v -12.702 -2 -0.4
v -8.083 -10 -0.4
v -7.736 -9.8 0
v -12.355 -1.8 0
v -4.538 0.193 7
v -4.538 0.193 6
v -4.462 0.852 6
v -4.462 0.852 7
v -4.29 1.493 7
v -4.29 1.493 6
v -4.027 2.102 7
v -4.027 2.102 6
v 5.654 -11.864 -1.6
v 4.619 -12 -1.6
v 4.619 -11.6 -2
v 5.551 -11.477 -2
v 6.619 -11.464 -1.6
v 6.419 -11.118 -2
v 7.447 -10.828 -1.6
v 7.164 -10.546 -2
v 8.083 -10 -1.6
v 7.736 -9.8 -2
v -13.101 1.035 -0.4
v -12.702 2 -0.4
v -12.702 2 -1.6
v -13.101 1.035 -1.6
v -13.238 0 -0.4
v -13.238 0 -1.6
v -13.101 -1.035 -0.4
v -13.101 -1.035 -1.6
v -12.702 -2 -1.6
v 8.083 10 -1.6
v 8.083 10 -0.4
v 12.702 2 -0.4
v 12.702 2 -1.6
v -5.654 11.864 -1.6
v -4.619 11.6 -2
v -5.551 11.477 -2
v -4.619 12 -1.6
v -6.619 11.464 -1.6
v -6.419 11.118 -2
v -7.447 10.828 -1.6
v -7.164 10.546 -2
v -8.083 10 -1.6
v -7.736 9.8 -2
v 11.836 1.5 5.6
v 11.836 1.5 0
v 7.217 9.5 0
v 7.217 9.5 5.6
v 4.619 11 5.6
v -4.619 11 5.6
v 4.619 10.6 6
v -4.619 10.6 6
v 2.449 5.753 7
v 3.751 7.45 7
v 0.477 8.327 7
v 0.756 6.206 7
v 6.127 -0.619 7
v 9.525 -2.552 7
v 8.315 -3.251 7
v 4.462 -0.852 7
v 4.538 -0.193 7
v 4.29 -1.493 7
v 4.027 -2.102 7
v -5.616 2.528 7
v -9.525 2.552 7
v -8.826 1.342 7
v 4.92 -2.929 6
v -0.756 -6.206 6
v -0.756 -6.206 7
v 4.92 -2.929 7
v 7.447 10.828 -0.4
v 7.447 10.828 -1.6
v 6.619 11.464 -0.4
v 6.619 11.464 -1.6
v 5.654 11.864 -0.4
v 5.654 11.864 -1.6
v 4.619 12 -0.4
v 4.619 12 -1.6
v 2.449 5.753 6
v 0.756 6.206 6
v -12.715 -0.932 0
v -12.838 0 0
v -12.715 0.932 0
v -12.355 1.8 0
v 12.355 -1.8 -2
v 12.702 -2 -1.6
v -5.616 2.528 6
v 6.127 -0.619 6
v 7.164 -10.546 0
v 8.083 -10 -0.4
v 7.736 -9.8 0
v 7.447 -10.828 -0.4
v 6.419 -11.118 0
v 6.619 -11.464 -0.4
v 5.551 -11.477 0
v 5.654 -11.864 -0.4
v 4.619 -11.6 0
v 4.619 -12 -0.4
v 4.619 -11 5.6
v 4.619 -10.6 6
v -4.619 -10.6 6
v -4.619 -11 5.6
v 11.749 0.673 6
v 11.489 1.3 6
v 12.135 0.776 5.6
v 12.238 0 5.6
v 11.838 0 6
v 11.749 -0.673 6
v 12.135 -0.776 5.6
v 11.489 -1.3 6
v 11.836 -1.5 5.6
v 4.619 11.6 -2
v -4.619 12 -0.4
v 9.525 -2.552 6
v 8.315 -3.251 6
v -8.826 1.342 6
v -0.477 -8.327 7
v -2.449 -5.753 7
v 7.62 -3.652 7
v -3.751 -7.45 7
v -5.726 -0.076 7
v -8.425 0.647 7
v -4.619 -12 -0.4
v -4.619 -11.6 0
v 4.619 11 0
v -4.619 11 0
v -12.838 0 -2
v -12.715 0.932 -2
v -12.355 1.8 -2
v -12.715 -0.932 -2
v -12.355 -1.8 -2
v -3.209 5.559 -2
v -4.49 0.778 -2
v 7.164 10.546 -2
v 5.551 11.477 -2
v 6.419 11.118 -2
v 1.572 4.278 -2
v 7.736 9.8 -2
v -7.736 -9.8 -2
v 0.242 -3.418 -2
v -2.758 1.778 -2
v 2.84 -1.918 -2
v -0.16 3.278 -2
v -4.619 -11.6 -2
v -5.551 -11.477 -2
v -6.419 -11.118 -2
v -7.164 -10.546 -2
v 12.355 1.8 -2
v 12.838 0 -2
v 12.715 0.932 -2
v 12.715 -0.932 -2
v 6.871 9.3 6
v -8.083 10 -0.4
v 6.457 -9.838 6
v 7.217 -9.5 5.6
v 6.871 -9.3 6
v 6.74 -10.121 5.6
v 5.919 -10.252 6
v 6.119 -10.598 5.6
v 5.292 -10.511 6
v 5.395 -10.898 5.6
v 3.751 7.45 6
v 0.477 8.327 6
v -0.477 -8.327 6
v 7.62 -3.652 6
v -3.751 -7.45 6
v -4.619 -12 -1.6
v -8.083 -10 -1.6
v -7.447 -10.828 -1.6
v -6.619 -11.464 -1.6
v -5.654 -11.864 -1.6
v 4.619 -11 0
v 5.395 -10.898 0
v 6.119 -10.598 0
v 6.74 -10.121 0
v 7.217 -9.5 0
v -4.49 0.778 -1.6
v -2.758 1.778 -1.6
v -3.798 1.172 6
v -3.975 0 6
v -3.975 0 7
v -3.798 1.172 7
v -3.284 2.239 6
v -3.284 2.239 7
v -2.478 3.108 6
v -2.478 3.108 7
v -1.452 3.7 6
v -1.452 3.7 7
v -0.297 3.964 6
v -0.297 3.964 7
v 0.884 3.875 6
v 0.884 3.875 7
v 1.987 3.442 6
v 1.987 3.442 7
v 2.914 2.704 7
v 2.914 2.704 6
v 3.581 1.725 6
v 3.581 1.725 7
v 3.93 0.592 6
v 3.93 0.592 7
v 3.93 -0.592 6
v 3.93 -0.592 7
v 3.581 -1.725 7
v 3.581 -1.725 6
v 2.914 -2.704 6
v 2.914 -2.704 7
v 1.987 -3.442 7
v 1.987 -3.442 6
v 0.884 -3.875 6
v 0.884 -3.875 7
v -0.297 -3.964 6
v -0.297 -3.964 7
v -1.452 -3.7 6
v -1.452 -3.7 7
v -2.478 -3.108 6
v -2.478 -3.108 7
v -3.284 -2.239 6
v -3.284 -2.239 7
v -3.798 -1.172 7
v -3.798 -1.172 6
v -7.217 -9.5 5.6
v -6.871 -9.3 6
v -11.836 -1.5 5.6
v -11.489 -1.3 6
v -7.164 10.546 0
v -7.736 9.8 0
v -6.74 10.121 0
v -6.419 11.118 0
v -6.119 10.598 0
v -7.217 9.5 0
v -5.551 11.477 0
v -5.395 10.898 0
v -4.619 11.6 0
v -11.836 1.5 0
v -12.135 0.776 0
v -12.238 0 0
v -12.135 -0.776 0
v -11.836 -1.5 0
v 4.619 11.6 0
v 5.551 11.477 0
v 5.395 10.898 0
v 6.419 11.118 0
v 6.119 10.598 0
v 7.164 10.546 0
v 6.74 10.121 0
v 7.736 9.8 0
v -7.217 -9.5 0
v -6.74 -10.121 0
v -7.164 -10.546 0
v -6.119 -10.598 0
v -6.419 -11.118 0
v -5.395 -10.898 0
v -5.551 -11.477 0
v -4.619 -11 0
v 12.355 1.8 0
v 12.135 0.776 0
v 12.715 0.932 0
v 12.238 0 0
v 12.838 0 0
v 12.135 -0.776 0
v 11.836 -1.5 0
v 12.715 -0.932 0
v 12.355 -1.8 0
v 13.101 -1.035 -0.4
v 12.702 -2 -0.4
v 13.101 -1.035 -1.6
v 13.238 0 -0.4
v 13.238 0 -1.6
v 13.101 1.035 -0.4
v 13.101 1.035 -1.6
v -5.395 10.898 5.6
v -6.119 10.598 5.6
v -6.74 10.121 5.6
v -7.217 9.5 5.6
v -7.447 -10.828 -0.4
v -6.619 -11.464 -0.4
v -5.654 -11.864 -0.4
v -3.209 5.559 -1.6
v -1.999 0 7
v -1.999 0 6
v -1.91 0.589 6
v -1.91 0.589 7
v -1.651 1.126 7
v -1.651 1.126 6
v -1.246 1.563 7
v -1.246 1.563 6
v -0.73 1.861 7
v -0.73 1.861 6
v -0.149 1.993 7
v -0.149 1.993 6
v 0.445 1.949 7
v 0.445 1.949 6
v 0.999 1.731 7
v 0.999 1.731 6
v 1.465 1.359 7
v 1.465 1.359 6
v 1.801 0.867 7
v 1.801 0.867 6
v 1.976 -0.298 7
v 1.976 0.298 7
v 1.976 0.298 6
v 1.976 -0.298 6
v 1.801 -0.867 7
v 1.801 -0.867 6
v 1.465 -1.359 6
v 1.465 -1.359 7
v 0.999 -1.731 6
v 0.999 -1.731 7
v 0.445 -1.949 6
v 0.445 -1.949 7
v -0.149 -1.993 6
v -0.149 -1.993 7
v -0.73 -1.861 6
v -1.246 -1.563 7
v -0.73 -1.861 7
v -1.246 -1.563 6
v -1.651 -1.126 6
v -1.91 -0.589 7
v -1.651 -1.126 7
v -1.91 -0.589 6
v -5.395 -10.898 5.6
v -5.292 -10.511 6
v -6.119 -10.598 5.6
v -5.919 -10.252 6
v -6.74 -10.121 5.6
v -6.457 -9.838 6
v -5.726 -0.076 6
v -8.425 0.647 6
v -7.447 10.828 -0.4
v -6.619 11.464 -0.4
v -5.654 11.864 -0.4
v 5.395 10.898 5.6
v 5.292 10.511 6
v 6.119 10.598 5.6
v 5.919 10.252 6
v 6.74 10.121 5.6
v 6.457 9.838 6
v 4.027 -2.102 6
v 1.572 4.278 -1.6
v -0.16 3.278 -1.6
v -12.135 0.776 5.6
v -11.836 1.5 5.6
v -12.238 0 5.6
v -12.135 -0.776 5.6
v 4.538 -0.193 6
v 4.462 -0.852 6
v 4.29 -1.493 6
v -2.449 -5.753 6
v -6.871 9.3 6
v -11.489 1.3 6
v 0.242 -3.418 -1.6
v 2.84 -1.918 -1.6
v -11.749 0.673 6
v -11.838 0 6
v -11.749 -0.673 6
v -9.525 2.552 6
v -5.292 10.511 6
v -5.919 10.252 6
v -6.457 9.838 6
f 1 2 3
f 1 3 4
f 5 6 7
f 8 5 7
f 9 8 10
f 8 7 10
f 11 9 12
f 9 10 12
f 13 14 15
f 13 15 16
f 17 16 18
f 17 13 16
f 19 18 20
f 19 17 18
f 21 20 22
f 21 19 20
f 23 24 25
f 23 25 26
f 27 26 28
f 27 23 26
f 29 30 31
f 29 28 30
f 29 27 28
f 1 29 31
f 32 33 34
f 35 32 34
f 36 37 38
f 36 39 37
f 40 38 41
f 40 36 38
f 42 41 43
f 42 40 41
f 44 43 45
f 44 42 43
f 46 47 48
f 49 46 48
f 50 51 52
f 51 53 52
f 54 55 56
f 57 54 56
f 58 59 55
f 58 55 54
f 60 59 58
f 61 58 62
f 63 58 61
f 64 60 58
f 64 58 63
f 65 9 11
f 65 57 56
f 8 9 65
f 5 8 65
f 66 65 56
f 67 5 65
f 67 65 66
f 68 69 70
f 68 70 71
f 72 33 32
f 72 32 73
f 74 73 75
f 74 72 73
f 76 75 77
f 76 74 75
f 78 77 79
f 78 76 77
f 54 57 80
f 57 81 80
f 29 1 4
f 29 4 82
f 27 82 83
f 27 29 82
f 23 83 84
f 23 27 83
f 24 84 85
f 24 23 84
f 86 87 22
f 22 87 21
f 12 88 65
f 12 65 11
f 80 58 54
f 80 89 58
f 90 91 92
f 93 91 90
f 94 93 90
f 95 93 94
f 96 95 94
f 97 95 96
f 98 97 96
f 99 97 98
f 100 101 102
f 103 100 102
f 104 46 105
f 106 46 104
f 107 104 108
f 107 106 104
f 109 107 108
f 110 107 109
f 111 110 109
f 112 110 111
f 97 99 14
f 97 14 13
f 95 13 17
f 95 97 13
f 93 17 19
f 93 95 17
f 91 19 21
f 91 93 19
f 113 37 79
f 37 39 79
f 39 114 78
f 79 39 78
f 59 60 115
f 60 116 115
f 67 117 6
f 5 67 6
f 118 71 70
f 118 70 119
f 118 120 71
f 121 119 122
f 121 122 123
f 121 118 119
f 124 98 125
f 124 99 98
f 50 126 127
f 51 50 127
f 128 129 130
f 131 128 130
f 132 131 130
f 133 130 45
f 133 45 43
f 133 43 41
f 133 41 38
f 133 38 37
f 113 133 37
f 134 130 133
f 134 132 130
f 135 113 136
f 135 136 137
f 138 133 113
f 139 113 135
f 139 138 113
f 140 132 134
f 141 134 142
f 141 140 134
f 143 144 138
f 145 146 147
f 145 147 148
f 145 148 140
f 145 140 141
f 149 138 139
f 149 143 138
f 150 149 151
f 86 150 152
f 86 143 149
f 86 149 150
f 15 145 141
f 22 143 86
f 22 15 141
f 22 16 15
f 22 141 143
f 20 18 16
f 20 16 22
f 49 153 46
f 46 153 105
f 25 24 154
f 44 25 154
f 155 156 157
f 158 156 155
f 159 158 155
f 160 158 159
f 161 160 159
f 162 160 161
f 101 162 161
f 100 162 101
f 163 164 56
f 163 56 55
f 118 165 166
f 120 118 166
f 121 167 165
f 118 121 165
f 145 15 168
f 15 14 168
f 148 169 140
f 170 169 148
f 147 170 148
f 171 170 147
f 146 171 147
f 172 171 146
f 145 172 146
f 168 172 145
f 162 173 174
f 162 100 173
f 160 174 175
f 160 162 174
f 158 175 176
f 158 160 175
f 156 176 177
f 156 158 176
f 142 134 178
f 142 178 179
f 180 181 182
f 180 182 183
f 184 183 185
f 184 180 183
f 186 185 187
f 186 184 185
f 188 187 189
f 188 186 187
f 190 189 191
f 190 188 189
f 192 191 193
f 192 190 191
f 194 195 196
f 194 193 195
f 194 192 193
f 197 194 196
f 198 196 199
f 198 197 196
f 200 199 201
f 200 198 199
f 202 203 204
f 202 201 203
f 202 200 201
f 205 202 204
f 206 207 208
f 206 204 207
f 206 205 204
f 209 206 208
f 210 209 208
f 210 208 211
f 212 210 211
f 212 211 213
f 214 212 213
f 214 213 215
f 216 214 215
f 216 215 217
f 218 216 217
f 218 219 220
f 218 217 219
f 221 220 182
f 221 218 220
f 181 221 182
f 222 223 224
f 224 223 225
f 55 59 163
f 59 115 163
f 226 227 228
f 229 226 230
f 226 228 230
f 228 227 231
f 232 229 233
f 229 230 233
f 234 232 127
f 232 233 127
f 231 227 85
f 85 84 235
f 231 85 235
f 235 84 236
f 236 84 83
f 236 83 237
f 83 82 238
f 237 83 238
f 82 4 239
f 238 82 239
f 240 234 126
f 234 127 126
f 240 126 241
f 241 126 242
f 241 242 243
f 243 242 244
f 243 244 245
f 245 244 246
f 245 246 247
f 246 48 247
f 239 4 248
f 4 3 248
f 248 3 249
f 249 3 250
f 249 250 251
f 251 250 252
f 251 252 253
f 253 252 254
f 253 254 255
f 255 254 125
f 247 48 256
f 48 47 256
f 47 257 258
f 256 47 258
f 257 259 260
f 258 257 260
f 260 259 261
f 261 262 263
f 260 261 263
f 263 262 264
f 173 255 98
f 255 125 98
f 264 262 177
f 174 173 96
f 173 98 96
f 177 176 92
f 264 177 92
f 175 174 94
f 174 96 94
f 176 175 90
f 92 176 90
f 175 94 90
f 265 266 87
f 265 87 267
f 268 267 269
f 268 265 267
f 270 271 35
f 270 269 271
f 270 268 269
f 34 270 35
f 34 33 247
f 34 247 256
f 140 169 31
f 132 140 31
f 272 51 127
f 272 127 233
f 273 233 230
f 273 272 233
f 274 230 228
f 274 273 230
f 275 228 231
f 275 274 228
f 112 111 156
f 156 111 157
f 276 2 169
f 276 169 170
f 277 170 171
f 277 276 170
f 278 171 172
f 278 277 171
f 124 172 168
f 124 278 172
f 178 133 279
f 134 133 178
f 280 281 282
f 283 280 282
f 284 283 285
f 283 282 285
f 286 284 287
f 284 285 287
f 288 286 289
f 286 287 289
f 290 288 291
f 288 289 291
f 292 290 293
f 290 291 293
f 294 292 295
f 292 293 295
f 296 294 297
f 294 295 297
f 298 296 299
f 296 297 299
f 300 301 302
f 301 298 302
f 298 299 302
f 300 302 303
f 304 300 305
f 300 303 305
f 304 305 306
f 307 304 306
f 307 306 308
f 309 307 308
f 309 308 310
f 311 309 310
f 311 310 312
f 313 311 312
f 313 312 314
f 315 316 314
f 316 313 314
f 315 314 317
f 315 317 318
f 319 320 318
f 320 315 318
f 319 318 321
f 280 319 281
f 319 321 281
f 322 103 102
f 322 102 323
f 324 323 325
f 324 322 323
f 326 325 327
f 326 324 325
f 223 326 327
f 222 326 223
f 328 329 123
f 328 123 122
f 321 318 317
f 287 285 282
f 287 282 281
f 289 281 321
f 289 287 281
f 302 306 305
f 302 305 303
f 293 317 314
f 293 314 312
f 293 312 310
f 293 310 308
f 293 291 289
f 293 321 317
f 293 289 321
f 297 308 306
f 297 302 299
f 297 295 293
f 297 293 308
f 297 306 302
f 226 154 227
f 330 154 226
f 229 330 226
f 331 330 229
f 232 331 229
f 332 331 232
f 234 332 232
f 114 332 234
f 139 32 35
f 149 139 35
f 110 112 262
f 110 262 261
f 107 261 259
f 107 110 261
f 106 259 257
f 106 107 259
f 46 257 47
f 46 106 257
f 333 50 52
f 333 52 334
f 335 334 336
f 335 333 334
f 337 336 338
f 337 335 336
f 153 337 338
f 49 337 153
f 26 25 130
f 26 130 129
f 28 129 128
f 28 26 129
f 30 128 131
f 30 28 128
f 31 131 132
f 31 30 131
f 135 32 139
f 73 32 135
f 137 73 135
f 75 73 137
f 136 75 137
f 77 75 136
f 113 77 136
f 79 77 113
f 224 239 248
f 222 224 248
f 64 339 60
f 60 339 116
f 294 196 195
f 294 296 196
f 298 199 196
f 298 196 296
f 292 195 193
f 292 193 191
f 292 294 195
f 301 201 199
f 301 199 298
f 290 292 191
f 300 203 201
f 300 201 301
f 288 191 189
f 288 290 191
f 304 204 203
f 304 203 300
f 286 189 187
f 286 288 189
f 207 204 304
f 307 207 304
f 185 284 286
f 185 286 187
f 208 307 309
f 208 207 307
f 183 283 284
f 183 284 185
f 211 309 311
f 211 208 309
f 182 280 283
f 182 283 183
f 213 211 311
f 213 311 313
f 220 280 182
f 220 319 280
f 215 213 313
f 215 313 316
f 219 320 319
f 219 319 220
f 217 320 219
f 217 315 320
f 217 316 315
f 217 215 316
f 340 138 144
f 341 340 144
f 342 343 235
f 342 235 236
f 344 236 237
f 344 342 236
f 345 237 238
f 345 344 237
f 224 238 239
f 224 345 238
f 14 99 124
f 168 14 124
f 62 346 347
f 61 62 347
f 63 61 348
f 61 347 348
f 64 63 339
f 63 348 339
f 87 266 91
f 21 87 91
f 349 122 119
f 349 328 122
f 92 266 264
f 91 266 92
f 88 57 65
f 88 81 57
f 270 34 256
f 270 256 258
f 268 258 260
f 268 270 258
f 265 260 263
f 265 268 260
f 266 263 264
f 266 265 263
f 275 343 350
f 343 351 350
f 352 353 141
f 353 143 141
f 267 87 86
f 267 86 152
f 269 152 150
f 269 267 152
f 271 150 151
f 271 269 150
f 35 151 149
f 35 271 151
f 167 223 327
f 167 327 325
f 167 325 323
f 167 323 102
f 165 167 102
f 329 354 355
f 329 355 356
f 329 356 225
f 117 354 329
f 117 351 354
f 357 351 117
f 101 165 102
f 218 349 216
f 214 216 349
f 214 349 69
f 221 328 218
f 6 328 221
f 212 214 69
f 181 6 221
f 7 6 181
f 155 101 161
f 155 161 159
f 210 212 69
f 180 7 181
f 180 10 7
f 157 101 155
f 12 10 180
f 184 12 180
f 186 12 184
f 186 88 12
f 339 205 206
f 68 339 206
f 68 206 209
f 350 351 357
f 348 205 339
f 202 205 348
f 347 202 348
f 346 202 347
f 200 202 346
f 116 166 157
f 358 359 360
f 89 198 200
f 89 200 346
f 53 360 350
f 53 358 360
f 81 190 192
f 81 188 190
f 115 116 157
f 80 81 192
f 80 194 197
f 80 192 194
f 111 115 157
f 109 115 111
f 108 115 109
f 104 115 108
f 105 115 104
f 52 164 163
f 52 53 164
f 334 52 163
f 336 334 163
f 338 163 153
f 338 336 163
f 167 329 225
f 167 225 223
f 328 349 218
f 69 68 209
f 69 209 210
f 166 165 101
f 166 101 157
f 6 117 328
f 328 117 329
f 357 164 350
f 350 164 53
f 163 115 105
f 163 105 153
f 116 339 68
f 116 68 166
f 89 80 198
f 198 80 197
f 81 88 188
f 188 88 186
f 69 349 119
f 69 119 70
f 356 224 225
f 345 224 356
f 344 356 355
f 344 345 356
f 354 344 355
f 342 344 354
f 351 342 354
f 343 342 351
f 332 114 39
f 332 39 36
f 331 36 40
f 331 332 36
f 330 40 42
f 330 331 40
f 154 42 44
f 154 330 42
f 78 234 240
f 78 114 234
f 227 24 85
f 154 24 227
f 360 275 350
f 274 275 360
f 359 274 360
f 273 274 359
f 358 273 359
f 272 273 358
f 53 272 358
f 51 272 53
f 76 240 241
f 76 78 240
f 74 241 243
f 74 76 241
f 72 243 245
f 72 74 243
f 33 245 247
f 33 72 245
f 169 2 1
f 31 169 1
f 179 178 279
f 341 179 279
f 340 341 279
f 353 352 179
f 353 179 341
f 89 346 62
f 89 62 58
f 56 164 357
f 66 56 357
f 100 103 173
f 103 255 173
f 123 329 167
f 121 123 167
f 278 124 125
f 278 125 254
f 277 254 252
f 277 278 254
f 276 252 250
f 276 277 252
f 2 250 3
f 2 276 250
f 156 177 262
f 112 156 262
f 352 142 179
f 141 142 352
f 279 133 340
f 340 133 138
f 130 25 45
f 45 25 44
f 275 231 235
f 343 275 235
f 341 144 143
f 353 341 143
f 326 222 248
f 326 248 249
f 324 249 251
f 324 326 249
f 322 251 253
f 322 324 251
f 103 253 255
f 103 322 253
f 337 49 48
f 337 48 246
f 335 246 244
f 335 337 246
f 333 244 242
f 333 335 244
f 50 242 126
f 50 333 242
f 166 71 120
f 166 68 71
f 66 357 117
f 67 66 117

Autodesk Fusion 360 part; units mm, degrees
sketch "Sketch1" plane through (0, 0, 0) normal (0, 0, 1) x (1, 0, 0)
  line L0 (-6.3509, 11) -> (-12.7017, 0)
  line L1 (-12.7017, 0) -> (-6.3509, -11)
  line L2 (-6.3509, -11) -> (6.3509, -11)
  line L3 (6.3509, -11) -> (12.7017, 0)
  line L4 (12.7017, 0) -> (6.3509, 11)
  line L5 (6.3509, 11) -> (-6.3509, 11)
  dimension "d1" = 11
extrude "Extrude1" add sketch "Sketch1" along normal blind 6
fillet "Fillet1" radius 3 6 edges at (6.3509, -11, 3) (12.7017, 0, 3) (-6.3509, -11, 3) (-12.7017, 0, 3) (-6.3509, 11, 3) (6.3509, 11, 3)
sketch "Sketch2" plane through (0, 0, 0) normal (0, 0, -1) x (1, 0, 0)
  arc A0 (4.6188, -11) -> (7.2169, -9.5) centre (4.6188, -8) ccw
  line L0 (7.2169, -9.5) -> (11.8357, -1.5)
  arc A1 (11.8357, -1.5) -> (11.8357, 1.5) centre (9.2376, 0) ccw
  line L1 (11.8357, 1.5) -> (7.2169, 9.5) construction
  arc A2 (7.2169, 9.5) -> (4.6188, 11) centre (4.6188, 8) ccw
  line L2 (4.6188, 11) -> (-4.6188, 11)
  arc A3 (-4.6188, 11) -> (-7.2169, 9.5) centre (-4.6188, 8) ccw
  line L3 (-7.2169, 9.5) -> (-11.8357, 1.5)
  arc A4 (-11.8357, 1.5) -> (-11.8357, -1.5) centre (-9.2376, 0) ccw
  line L4 (-11.8357, -1.5) -> (-7.2169, -9.5)
  arc A5 (-7.2169, -9.5) -> (-4.6188, -11) centre (-4.6188, -8) ccw
  line L5 (-4.6188, -11) -> (4.6188, -11)
  line L6 (-8.0829, 10) -> (-12.7017, 2)
  arc A6 (-12.7017, 2) -> (-12.7017, -2) centre (-9.2376, 0) ccw
  line L7 (-12.7017, -2) -> (-8.0829, -10)
  arc A7 (-8.0829, -10) -> (-4.6188, -12) centre (-4.6188, -8) ccw
  line L8 (-4.6188, -12) -> (4.6188, -12)
  arc A8 (4.6188, -12) -> (8.0829, -10) centre (4.6188, -8) ccw
  line L9 (8.0829, -10) -> (12.7017, -2)
  arc A9 (12.7017, -2) -> (12.7017, 2) centre (9.2376, 0) ccw
  line L10 (12.7017, 2) -> (8.0829, 10)
  arc A10 (8.0829, 10) -> (4.6188, 12) centre (4.6188, 8) ccw
  line L11 (4.6188, 12) -> (-4.6188, 12)
  arc A11 (-4.6188, 12) -> (-8.0829, 10) centre (-4.6188, 8) ccw
  dimension "d6" = 1
extrude "Extrude2" add sketch "Sketch2" along normal blind 2
sketch "Sketch3" plane through (0, 0, 6) normal (0, 0, 1) x (-1, 0, 0)
  arc A0 (-7.2169, -9.5) -> (-4.6188, -11) centre (-4.6188, -8) ccw
  line L0 (-4.6188, -11) -> (4.6188, -11)
  arc A1 (4.6188, -11) -> (7.2169, -9.5) centre (4.6188, -8) ccw
  line L1 (7.2169, -9.5) -> (11.8357, -1.5) construction
  arc A2 (11.8357, -1.5) -> (11.8357, 1.5) centre (9.2376, 0) ccw
  line L2 (11.8357, 1.5) -> (7.2169, 9.5)
  arc A3 (7.2169, 9.5) -> (4.6188, 11) centre (4.6188, 8) ccw
  line L3 (4.6188, 11) -> (-4.6188, 11)
  arc A4 (-4.6188, 11) -> (-7.2169, 9.5) centre (-4.6188, 8) ccw
  line L4 (-7.2169, 9.5) -> (-11.8357, 1.5)
  arc A5 (-11.8357, 1.5) -> (-11.8357, -1.5) centre (-9.2376, 0) ccw
  line L5 (-11.8357, -1.5) -> (-7.2169, -9.5)
  line L6 (8.425, -0.6467) -> (5.7257, 0.0765)
  line L7 (5.6158, -2.5276) -> (4.0271, -2.1019)
  line L8 (5.7257, 0.0765) -> (2.4486, 5.7527)
  line L9 (-4.0271, 2.1019) -> (-8.3151, 3.2509)
  line L10 (-0.4766, -8.3268) -> (9.5251, -2.5523)
  line L11 (-9.5251, 2.5523) -> (-3.7506, -7.4495)
  line L12 (8.425, -0.6467) -> (3.7506, 7.4495)
  line L13 (-0.7558, -6.2062) -> (5.6158, -2.5276)
  line L14 (-4.9203, 2.9291) -> (-7.6196, 3.6524)
  line L15 (-8.3151, 3.2509) -> (-9.5251, 2.5523)
  line L16 (0.7558, 6.2062) -> (-4.9203, 2.9291)
  line L17 (0.4766, 8.3268) -> (-7.6196, 3.6524)
  line L18 (9.5251, -2.5523) -> (8.8265, -1.3422)
  line L19 (-6.1272, 0.6189) -> (-2.4486, -5.7527)
  line L20 (8.8265, -1.3422) -> (4.5385, -0.1932)
  line L21 (3.7506, 7.4495) -> (0.4766, 8.3268)
  line L22 (2.4486, 5.7527) -> (0.7558, 6.2062)
  line L23 (-0.7558, -6.2062) -> (-2.4486, -5.7527)
  line L24 (-0.4766, -8.3268) -> (-3.7506, -7.4495)
  circle A6 centre (0, 0) radius 1.9987
  circle A7 centre (0, 0) radius 3.9748
  arc A8 (-4.0271, 2.1019) -> (-4.5385, 0.1932) centre (0, 0) ccw
  line L25 (-4.5385, 0.1932) -> (-6.1272, 0.6189)
  arc A9 (4.0271, -2.1019) -> (4.5385, -0.1932) centre (0, 0) ccw
extrude "Extrude3" add sketch "Sketch3" along normal blind 1
chamfer "Chamfer1" distance 0.4 angle 45 36 edges at (9.5263, -5.5, 6) (12.2376, 0, 6) (9.5263, 5.5, 6) (6.1188, 10.5981, 6) (0, 11, 6) (-6.1188, 10.5981, 6) (-9.5263, 5.5, 6) (-12.2376, 0, 6) (-9.5263, -5.5, 6) (-6.1188, -10.5981, 6) (0, -11, 6) (6.1188, -10.5981, 6) (10.3923, -6, 0) (6.6188, -11.4641, 0) (0, -12, 0) (-6.6188, -11.4641, 0) (-10.3923, -6, 0) (-13.2376, 0, 0) (-10.3923, 6, 0) (-6.6188, 11.4641, 0) (0, 12, 0) (6.6188, 11.4641, 0) (10.3923, 6, 0) (13.2376, 0, 0) (10.3923, -6, -2) (6.6188, -11.4641, -2) (0, -12, -2) (-6.6188, -11.4641, -2) (-10.3923, -6, -2) (-13.2376, 0, -2) (-10.3923, 6, -2) (-6.6188, 11.4641, -2) (0, 12, -2) (6.6188, 11.4641, -2) (10.3923, 6, -2) (13.2376, 0, -2)
sketch "Sketch4" plane through (0, 0, -2) normal (0, 0, -1) x (1, 0, 0)
  line L0 (12.3553, 1.8) -> (7.7365, 9.8)
  arc A0 (7.7365, 9.8) -> (4.6188, 11.6) centre (4.6188, 8) ccw
  line L1 (4.6188, 11.6) -> (-4.6188, 11.6)
  arc A1 (-4.6188, 11.6) -> (-7.7365, 9.8) centre (-4.6188, 8) ccw
  line L2 (-7.7365, 9.8) -> (-12.3553, 1.8)
  arc A2 (-12.3553, 1.8) -> (-12.3553, -1.8) centre (-9.2376, 0) ccw
  line L3 (-12.3553, -1.8) -> (-7.7365, -9.8)
  arc A3 (-7.7365, -9.8) -> (-4.6188, -11.6) centre (-4.6188, -8) ccw
  line L4 (-4.6188, -11.6) -> (4.6188, -11.6)
  arc A4 (4.6188, -11.6) -> (7.7365, -9.8) centre (4.6188, -8) ccw
  line L5 (7.7365, -9.8) -> (12.3553, -1.8)
  arc A5 (12.3553, -1.8) -> (12.3553, 1.8) centre (9.2376, 0) ccw
  line L6 (0, 0) -> (-6.4188, -11.1177) construction
  line L7 (-3.2094, -5.5588) -> (1.5717, -4.2778)
  line L8 (1.5717, -4.2778) -> (-0.1604, -3.2778)
  line L9 (-0.1604, -3.2778) -> (2.8396, 1.9184)
  line L10 (2.8396, 1.9184) -> (1.5406, 2.6684)
  line L11 (1.5406, 2.6684) -> (0, 0) construction
  line L12 (-3.2094, -5.5588) -> (-4.4905, -0.7778)
  line L13 (-4.4905, -0.7778) -> (-2.7584, -1.7778)
  line L14 (0.2416, 3.4184) -> (1.5406, 2.6684)
  line L15 (-2.7584, -1.7778) -> (0.2416, 3.4184)
  dimension "d14" = 1.5
  dimension "d15" = 2
  dimension "d16" = 45
  dimension "d17" = 6
extrude "Extrude4" cut sketch "Sketch4" against normal blind 0.4 contours L7 L8 L9 L10 L12 L13 L14 L15
